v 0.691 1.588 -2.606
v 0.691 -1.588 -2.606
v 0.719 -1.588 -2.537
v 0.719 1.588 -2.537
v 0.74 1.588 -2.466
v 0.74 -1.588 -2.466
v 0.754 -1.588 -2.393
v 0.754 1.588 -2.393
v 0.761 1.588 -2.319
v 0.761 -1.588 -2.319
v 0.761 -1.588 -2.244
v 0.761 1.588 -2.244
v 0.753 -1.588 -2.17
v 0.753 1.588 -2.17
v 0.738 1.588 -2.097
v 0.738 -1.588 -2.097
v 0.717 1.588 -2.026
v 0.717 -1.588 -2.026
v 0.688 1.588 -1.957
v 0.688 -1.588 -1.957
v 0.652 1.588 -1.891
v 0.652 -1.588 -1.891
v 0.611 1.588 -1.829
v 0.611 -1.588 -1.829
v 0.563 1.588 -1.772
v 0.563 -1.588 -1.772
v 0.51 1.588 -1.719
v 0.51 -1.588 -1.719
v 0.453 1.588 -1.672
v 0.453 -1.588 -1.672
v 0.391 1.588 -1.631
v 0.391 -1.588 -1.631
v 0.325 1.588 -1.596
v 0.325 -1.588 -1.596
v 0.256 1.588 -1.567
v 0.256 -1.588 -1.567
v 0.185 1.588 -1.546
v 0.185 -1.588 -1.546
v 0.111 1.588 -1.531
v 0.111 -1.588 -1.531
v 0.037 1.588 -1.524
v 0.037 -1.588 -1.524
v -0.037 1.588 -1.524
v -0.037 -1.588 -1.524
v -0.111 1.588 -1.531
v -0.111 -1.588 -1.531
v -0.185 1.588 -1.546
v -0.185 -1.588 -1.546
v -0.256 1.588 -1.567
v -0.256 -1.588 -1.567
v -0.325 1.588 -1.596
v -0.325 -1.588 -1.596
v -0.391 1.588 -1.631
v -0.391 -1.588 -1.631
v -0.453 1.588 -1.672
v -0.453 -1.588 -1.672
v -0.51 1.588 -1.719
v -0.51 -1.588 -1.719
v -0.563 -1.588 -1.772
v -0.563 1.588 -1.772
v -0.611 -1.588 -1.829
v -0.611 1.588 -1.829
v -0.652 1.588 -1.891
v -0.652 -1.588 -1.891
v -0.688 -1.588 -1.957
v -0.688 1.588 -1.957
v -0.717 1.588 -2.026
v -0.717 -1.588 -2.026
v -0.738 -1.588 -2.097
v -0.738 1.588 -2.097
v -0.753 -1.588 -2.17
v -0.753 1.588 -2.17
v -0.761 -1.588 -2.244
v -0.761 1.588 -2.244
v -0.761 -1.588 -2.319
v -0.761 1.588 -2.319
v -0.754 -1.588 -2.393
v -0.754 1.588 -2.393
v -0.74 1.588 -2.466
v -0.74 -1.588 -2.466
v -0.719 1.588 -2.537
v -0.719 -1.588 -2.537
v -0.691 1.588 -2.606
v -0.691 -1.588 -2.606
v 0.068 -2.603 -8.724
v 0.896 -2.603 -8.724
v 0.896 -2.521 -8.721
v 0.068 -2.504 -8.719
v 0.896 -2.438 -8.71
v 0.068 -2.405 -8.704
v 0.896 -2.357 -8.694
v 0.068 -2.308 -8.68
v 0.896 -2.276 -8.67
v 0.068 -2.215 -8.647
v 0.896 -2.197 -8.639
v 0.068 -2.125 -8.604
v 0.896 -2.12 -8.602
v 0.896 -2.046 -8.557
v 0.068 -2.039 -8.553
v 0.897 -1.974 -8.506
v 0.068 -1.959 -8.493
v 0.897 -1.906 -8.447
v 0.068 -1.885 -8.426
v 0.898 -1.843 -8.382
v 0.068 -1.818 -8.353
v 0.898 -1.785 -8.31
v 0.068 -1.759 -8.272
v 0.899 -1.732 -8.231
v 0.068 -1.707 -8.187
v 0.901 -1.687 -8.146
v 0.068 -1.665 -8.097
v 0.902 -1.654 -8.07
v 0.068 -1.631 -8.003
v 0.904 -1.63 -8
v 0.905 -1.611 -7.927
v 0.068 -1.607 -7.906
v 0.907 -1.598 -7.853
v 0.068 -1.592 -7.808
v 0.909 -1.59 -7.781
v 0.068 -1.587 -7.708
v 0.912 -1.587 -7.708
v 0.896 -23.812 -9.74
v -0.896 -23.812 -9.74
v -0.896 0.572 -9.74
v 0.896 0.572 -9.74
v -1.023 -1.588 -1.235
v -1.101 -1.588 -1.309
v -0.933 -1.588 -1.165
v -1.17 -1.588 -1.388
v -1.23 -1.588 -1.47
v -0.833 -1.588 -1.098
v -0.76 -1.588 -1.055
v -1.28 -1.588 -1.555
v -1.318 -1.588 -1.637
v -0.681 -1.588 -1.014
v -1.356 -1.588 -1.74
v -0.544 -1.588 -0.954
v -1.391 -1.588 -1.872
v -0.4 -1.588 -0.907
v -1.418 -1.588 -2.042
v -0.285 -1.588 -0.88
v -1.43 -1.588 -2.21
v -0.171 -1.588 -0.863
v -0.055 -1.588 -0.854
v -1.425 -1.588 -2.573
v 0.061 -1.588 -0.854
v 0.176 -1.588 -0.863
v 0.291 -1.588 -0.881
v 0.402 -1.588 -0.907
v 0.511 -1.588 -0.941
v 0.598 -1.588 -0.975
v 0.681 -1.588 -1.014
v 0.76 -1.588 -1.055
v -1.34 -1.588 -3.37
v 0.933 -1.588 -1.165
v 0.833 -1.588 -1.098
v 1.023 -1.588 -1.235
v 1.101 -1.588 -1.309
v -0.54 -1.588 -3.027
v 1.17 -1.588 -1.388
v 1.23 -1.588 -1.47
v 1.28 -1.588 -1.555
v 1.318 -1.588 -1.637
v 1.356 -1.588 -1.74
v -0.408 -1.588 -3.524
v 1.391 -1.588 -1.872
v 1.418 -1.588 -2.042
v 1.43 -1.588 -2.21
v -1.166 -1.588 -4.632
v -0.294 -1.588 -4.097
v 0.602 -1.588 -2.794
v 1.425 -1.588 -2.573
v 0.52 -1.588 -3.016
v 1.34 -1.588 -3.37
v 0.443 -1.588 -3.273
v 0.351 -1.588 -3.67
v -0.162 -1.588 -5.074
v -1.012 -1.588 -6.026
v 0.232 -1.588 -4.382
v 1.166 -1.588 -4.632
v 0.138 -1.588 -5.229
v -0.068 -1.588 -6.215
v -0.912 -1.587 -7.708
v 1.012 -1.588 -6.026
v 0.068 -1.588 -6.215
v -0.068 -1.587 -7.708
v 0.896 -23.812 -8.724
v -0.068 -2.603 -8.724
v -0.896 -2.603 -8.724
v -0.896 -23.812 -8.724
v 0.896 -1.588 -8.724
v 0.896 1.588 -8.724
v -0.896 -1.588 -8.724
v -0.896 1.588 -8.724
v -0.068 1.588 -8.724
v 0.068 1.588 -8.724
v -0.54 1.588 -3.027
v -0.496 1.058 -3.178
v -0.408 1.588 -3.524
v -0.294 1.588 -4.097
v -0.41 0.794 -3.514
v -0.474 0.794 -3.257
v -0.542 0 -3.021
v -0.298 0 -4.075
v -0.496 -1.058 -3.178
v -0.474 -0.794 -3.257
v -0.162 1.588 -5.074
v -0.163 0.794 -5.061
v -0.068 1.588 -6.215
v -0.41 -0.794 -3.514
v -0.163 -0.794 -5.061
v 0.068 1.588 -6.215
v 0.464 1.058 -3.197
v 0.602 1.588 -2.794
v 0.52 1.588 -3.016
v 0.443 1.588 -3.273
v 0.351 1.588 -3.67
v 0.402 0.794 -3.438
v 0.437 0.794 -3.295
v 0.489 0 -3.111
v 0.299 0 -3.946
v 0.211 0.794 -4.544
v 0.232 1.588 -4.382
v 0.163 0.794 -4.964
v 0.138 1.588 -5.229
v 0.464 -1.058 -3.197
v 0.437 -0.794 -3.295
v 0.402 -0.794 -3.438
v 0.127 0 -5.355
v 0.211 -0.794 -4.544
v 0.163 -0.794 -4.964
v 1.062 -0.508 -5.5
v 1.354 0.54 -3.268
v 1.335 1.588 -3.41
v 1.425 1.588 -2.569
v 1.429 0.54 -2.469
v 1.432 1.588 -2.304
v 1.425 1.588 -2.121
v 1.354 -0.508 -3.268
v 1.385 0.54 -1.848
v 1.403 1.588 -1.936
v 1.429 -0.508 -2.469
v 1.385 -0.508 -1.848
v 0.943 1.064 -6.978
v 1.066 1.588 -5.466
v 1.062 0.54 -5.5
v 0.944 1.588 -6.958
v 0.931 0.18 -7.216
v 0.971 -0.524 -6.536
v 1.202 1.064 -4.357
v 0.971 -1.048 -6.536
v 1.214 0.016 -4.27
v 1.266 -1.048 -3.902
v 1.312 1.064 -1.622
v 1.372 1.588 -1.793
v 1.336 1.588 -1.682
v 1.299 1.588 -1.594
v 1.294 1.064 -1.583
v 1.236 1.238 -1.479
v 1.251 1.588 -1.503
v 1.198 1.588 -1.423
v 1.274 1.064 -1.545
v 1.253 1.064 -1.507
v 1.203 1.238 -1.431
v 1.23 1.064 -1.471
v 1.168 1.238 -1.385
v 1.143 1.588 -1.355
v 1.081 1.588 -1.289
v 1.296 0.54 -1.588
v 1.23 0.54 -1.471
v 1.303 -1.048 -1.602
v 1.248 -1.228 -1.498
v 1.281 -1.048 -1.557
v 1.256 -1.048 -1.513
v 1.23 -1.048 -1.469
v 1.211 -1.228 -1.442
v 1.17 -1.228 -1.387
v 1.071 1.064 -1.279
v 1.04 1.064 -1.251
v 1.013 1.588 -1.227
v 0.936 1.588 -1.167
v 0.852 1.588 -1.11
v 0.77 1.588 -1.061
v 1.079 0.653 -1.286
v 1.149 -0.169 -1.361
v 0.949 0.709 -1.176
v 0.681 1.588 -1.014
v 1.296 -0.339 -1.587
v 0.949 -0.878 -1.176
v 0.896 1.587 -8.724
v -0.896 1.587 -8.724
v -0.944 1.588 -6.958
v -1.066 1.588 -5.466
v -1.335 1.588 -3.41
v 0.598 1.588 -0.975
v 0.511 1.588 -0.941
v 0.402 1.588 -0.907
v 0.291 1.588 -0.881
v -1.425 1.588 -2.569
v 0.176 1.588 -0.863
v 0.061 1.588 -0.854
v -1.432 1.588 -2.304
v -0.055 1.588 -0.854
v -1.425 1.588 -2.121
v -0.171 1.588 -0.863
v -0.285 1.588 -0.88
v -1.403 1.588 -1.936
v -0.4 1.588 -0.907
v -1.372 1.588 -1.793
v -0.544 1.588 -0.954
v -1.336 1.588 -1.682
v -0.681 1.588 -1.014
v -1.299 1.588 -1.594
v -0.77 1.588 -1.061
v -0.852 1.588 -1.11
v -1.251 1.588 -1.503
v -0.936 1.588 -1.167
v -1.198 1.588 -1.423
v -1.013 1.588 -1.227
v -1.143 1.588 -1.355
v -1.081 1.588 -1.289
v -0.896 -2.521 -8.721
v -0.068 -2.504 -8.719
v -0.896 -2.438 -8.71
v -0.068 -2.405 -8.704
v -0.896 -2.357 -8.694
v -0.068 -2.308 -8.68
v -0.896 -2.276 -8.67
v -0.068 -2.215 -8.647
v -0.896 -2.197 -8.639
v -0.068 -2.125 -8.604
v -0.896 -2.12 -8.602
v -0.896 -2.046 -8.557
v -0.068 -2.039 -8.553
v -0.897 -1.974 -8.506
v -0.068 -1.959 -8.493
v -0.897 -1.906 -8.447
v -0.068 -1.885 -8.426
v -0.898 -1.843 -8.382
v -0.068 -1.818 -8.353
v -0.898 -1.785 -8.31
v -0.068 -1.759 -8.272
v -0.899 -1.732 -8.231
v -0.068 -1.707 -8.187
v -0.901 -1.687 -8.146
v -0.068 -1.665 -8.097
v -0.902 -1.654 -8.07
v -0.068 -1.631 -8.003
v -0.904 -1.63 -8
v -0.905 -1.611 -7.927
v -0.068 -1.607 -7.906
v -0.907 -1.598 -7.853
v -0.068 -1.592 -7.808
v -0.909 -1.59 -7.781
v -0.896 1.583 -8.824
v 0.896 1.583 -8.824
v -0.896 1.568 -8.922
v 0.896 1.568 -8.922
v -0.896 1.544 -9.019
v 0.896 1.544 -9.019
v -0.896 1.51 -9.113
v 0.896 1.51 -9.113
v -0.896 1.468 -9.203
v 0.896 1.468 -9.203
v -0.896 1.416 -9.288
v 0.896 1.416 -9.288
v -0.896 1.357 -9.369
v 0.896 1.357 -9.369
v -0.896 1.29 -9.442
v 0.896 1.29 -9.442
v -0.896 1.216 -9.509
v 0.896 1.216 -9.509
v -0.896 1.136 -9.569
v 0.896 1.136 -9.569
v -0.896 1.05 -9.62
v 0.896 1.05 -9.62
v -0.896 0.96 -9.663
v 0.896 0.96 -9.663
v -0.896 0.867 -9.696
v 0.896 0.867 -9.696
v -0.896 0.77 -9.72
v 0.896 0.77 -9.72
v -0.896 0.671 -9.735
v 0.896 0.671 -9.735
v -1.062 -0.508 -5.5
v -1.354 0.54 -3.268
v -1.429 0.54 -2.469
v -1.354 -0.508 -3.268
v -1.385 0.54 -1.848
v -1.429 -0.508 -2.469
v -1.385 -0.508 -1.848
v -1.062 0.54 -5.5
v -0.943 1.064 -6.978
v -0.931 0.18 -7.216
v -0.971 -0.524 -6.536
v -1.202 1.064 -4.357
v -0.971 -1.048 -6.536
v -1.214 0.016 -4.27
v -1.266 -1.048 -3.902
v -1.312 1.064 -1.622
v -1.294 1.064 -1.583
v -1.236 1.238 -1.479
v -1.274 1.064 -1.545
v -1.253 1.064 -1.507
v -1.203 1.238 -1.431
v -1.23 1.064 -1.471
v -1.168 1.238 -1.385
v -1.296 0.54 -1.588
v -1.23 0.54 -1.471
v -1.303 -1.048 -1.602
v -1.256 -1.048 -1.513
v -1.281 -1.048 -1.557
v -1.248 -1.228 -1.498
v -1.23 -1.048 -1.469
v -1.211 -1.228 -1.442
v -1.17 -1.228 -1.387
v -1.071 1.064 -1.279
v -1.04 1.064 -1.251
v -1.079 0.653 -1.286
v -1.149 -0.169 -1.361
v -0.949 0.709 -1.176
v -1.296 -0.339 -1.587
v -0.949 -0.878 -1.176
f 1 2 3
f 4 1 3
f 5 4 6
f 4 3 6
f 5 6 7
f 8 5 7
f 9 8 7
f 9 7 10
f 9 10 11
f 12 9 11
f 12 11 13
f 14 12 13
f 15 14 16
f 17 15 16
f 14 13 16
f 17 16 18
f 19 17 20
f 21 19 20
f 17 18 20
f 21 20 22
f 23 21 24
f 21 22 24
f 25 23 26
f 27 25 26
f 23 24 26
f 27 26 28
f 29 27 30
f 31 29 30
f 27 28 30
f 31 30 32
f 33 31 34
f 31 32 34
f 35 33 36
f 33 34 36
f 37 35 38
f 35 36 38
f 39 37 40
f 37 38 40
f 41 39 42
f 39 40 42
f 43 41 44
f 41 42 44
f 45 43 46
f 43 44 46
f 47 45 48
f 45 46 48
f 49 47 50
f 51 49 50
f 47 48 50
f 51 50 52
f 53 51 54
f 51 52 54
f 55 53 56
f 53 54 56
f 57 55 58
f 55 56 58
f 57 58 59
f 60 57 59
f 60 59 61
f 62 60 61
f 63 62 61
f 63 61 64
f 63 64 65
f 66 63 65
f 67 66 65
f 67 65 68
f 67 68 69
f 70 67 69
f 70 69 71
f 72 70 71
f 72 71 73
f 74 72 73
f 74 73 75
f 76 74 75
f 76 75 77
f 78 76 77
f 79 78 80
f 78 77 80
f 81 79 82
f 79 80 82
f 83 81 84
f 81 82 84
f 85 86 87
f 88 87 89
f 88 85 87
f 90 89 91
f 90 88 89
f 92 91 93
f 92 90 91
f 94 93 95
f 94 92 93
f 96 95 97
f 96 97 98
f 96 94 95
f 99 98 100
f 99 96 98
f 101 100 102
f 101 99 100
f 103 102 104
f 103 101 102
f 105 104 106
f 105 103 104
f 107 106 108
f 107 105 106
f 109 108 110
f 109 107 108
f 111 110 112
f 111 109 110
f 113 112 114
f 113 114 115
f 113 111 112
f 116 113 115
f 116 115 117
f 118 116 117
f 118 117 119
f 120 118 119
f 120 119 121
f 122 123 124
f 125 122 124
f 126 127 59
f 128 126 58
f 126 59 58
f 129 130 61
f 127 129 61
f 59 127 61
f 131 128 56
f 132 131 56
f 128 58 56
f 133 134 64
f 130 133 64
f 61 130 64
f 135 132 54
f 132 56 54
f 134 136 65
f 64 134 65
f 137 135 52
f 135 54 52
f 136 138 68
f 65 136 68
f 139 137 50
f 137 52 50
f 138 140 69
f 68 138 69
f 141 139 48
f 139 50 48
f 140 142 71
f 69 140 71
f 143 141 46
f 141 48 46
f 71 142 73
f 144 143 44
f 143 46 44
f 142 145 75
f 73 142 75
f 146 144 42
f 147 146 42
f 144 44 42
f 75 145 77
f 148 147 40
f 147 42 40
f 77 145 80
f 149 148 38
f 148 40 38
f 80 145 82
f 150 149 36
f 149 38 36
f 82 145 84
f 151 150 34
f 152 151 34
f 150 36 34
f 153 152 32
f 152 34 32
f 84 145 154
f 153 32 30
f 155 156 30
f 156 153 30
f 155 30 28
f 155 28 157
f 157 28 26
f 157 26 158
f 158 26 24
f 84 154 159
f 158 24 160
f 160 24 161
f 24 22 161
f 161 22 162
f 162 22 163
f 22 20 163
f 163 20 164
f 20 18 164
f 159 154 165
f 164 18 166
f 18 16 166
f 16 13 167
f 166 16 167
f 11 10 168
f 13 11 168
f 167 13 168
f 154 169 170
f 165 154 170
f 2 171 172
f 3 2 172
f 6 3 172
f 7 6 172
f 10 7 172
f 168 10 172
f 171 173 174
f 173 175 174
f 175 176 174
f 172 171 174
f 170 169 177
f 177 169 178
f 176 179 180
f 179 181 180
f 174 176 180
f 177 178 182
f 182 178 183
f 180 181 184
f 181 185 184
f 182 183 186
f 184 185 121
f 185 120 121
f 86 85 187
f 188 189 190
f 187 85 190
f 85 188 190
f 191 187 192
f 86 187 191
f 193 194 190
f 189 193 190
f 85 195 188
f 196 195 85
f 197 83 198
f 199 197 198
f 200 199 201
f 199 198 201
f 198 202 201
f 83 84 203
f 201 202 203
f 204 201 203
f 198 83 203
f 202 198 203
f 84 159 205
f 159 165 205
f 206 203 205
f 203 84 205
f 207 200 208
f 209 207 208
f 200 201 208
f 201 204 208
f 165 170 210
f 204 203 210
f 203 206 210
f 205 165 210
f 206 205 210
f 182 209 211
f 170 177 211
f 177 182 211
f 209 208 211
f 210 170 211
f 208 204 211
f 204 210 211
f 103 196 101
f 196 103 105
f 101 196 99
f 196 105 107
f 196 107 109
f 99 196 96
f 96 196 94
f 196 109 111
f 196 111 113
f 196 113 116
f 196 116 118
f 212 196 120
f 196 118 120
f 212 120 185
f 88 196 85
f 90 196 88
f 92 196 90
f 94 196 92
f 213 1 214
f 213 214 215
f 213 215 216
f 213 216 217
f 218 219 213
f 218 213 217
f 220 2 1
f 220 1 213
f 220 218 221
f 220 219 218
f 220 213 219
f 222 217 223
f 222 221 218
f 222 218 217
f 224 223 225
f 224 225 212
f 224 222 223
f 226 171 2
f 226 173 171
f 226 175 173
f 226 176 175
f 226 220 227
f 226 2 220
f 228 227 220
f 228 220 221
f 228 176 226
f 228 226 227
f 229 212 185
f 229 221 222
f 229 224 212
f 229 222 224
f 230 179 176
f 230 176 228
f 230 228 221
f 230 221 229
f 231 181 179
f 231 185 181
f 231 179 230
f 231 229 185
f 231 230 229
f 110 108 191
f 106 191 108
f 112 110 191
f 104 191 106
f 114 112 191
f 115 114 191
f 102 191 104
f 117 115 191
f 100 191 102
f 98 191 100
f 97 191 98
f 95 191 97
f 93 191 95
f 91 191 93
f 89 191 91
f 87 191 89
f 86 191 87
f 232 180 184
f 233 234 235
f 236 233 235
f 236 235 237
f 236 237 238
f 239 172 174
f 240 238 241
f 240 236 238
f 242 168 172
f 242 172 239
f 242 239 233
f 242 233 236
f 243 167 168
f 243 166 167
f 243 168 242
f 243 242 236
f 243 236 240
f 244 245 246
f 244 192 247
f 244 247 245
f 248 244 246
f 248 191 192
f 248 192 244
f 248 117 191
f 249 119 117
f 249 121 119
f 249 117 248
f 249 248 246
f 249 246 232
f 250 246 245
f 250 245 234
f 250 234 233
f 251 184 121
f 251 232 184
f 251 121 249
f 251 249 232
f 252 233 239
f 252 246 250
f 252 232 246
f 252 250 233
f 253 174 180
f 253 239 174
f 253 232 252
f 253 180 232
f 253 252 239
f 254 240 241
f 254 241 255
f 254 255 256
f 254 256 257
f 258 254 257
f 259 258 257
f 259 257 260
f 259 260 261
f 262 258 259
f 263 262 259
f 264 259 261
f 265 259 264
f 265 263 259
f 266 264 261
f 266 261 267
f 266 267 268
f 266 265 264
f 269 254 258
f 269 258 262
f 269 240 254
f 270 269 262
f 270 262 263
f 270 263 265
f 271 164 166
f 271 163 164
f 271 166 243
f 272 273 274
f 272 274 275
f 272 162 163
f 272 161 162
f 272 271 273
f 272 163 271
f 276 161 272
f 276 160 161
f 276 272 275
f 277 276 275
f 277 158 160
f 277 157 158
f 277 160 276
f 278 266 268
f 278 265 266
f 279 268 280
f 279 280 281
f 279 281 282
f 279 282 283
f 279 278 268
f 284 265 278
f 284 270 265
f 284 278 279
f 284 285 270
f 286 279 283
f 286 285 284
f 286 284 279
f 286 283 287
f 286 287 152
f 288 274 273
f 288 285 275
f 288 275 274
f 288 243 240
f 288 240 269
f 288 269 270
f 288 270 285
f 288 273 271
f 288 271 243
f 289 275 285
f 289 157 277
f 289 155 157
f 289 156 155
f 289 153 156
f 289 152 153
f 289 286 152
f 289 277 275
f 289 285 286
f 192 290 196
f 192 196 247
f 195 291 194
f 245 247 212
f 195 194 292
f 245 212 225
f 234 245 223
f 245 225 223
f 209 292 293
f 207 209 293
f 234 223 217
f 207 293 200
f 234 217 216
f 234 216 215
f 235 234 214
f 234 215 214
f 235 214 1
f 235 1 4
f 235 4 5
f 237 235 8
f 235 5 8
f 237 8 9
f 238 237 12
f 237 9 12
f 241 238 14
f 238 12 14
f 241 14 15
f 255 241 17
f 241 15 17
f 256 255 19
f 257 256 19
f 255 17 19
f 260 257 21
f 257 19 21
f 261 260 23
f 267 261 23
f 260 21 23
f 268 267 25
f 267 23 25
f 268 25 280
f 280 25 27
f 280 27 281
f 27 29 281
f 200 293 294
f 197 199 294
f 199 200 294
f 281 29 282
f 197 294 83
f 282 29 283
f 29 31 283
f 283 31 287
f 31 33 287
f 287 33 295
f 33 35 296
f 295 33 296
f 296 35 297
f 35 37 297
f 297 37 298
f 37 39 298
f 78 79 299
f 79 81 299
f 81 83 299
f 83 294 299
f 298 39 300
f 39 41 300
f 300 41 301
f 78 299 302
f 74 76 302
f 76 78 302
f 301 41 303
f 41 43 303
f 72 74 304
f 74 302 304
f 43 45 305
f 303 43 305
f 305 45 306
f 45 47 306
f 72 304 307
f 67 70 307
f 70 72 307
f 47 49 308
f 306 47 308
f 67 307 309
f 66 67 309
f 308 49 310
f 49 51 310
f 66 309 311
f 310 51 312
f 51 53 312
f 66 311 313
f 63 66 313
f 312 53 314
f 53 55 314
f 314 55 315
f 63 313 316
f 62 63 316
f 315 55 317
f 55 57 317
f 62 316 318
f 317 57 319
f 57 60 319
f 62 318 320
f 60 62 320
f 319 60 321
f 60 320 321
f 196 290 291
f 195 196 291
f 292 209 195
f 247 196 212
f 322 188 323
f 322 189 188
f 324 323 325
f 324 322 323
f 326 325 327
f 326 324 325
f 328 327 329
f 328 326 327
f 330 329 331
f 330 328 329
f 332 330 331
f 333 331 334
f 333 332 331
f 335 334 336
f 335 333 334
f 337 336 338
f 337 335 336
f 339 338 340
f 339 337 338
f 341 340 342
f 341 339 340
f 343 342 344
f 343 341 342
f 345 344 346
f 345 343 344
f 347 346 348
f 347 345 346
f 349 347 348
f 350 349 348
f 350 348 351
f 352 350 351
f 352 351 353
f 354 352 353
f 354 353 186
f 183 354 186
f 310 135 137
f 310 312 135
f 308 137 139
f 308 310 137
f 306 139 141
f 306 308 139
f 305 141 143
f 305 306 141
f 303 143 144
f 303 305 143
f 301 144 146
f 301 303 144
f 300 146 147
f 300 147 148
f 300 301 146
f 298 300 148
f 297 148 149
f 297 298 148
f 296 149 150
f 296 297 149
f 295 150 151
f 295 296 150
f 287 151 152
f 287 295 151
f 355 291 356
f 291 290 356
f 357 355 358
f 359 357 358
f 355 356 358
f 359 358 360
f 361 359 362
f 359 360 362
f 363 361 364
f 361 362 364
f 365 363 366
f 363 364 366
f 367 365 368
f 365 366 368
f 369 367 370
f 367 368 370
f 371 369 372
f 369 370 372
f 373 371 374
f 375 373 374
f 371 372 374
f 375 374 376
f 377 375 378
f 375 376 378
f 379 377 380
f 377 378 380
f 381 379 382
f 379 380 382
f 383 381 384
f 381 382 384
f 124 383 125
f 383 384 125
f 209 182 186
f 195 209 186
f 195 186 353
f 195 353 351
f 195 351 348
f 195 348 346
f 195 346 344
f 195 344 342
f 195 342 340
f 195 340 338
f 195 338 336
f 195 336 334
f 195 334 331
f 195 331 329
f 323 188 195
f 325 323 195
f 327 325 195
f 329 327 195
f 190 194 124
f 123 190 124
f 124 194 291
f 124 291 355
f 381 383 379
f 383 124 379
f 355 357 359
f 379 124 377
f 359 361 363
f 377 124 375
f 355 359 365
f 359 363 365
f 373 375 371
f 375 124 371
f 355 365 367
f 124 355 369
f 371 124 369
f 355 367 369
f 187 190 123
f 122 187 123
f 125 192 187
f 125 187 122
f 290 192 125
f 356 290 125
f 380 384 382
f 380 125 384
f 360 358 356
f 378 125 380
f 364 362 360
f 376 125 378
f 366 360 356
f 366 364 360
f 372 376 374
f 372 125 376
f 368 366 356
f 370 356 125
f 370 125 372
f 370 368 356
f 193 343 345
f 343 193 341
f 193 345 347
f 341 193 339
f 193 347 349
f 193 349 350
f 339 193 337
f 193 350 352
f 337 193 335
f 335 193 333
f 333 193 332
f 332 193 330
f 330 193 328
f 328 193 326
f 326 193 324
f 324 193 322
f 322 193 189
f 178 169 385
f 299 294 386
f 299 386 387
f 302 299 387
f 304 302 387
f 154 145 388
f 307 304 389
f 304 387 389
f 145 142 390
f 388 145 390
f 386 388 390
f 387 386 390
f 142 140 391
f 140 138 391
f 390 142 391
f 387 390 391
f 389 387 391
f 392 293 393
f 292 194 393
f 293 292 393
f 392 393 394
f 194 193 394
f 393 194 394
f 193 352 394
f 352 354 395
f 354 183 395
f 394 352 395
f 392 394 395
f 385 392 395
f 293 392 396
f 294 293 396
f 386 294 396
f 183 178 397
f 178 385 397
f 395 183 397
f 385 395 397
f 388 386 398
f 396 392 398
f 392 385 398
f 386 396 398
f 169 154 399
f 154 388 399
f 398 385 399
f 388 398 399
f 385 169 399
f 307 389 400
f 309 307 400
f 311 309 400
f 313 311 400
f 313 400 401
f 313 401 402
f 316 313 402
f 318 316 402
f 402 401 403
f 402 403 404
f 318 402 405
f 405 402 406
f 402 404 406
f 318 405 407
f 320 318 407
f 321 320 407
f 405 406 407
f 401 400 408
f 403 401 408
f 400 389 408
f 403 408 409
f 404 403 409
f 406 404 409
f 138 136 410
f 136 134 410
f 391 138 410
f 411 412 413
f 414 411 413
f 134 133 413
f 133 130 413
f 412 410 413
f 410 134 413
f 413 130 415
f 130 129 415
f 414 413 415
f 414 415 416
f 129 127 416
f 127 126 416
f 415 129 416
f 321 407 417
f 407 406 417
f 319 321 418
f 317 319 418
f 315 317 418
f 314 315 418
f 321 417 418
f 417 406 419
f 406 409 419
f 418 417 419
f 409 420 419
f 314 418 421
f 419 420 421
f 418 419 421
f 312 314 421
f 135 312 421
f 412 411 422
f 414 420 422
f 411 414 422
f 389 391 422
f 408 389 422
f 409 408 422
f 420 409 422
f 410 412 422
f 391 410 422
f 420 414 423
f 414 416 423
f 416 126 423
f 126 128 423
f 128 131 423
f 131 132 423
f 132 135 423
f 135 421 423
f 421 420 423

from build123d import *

# Parameters (mm, degrees)
BOSS_EXTRUDE1_DEPTH      = 1.5875
BOSS_EXTRUDE1_DEPTH_BACK = 1.5875
FILLET1_R                = 1.524
BOSS_EXTRUDE2_DEPTH      = 0.89581
BOSS_EXTRUDE2_DEPTH_BACK = 0.89581
FILLET2_R                = 1.016


with BuildPart() as part:
    # Sketch1 → Boss-Extrude1 (new, two sides: drawn at the far end of the back side and taken through both)
    with BuildSketch(Plane(origin=(0, 0, 0), x_dir=(1, 0, 0), z_dir=(0, 1, 0)).offset(-BOSS_EXTRUDE1_DEPTH_BACK)):
        with BuildLine():
            Line((-0.068296764, 6.214618695), (-0.068296764, 8.723993601))
            Line((-0.068296764, 8.723993601), (-0.895808533, 8.723993601))
            add(Edge.make_bspline(
                [(-0.895808533, 8.723993601), (-0.895808533, 4.54222596), (-1.588668774, 2.219313027), (-2.088196173, 1.337696034), (0, 0.766240154)],
                knots=[0, 0, 0, 0, 0, 1, 1, 1, 1, 1], degree=4))
            add(Edge.make_bspline(
                [(0.895808533, 8.723993601), (0.895808533, 4.54222596), (1.588668774, 2.219313027), (2.088196173, 1.337696034), (0, 0.766240154)],
                knots=[0, 0, 0, 0, 0, 1, 1, 1, 1, 1], degree=4))
            Line((0.895808533, 8.723993601), (0.068296764, 8.723993601))
            Line((0.068296764, 8.723993601), (0.068296764, 6.214618695))
            add(Edge.make_bspline(
                [(0.690807422, 2.606475487), (0.218071276, 3.482132924), (0.068296764, 6.214618695)],
                knots=[0, 0, 0, 1, 1, 1], degree=2))
            ThreePointArc((0.690807422, 2.606475487), (0, 1.52287153), (-0.690807422, 2.606475487))
            add(Edge.make_bspline(
                [(-0.690807422, 2.606475487), (-0.217222133, 3.738734236), (-0.068296764, 6.214618695)],
                knots=[0, 0, 0, 1, 1, 1], degree=2))
        make_face()
    extrude(amount=BOSS_EXTRUDE1_DEPTH + BOSS_EXTRUDE1_DEPTH_BACK)

    # Fillet1
    fillet1_edges = [part.edges().sort_by_distance(p)[0] for p in [
        (0, -0.79375, -0.766240154),
    ]]
    fillet(fillet1_edges, radius=FILLET1_R)

    # Sketch2 → Boss-Extrude2 (add, two sides: drawn at the far end of the back side and taken through both)
    with BuildSketch(Plane(origin=(0, 0, 0), x_dir=(0, 0, -1), z_dir=(1, 0, 0)).offset(-BOSS_EXTRUDE2_DEPTH_BACK)):
        Polygon((8.723993601, 1.5875), (8.723993601, -1.5875), (8.723993601, -23.8125), (9.739993601, -23.8125), (9.739993601, 1.5875), align=None)
    extrude(amount=BOSS_EXTRUDE2_DEPTH + BOSS_EXTRUDE2_DEPTH_BACK)

    # Fillet2
    fillet2_edges = [part.edges().sort_by_distance(p)[0] for p in [
        (0, 1.5875, -9.739993601),
        (0.482052648, -1.5875, -8.723993601),
        (-0.482052648, -1.5875, -8.723993601),
    ]]
    fillet(fillet2_edges, radius=FILLET2_R - 0.0001)  # a hair under: the kernel refuses the full size


solid = part.part
